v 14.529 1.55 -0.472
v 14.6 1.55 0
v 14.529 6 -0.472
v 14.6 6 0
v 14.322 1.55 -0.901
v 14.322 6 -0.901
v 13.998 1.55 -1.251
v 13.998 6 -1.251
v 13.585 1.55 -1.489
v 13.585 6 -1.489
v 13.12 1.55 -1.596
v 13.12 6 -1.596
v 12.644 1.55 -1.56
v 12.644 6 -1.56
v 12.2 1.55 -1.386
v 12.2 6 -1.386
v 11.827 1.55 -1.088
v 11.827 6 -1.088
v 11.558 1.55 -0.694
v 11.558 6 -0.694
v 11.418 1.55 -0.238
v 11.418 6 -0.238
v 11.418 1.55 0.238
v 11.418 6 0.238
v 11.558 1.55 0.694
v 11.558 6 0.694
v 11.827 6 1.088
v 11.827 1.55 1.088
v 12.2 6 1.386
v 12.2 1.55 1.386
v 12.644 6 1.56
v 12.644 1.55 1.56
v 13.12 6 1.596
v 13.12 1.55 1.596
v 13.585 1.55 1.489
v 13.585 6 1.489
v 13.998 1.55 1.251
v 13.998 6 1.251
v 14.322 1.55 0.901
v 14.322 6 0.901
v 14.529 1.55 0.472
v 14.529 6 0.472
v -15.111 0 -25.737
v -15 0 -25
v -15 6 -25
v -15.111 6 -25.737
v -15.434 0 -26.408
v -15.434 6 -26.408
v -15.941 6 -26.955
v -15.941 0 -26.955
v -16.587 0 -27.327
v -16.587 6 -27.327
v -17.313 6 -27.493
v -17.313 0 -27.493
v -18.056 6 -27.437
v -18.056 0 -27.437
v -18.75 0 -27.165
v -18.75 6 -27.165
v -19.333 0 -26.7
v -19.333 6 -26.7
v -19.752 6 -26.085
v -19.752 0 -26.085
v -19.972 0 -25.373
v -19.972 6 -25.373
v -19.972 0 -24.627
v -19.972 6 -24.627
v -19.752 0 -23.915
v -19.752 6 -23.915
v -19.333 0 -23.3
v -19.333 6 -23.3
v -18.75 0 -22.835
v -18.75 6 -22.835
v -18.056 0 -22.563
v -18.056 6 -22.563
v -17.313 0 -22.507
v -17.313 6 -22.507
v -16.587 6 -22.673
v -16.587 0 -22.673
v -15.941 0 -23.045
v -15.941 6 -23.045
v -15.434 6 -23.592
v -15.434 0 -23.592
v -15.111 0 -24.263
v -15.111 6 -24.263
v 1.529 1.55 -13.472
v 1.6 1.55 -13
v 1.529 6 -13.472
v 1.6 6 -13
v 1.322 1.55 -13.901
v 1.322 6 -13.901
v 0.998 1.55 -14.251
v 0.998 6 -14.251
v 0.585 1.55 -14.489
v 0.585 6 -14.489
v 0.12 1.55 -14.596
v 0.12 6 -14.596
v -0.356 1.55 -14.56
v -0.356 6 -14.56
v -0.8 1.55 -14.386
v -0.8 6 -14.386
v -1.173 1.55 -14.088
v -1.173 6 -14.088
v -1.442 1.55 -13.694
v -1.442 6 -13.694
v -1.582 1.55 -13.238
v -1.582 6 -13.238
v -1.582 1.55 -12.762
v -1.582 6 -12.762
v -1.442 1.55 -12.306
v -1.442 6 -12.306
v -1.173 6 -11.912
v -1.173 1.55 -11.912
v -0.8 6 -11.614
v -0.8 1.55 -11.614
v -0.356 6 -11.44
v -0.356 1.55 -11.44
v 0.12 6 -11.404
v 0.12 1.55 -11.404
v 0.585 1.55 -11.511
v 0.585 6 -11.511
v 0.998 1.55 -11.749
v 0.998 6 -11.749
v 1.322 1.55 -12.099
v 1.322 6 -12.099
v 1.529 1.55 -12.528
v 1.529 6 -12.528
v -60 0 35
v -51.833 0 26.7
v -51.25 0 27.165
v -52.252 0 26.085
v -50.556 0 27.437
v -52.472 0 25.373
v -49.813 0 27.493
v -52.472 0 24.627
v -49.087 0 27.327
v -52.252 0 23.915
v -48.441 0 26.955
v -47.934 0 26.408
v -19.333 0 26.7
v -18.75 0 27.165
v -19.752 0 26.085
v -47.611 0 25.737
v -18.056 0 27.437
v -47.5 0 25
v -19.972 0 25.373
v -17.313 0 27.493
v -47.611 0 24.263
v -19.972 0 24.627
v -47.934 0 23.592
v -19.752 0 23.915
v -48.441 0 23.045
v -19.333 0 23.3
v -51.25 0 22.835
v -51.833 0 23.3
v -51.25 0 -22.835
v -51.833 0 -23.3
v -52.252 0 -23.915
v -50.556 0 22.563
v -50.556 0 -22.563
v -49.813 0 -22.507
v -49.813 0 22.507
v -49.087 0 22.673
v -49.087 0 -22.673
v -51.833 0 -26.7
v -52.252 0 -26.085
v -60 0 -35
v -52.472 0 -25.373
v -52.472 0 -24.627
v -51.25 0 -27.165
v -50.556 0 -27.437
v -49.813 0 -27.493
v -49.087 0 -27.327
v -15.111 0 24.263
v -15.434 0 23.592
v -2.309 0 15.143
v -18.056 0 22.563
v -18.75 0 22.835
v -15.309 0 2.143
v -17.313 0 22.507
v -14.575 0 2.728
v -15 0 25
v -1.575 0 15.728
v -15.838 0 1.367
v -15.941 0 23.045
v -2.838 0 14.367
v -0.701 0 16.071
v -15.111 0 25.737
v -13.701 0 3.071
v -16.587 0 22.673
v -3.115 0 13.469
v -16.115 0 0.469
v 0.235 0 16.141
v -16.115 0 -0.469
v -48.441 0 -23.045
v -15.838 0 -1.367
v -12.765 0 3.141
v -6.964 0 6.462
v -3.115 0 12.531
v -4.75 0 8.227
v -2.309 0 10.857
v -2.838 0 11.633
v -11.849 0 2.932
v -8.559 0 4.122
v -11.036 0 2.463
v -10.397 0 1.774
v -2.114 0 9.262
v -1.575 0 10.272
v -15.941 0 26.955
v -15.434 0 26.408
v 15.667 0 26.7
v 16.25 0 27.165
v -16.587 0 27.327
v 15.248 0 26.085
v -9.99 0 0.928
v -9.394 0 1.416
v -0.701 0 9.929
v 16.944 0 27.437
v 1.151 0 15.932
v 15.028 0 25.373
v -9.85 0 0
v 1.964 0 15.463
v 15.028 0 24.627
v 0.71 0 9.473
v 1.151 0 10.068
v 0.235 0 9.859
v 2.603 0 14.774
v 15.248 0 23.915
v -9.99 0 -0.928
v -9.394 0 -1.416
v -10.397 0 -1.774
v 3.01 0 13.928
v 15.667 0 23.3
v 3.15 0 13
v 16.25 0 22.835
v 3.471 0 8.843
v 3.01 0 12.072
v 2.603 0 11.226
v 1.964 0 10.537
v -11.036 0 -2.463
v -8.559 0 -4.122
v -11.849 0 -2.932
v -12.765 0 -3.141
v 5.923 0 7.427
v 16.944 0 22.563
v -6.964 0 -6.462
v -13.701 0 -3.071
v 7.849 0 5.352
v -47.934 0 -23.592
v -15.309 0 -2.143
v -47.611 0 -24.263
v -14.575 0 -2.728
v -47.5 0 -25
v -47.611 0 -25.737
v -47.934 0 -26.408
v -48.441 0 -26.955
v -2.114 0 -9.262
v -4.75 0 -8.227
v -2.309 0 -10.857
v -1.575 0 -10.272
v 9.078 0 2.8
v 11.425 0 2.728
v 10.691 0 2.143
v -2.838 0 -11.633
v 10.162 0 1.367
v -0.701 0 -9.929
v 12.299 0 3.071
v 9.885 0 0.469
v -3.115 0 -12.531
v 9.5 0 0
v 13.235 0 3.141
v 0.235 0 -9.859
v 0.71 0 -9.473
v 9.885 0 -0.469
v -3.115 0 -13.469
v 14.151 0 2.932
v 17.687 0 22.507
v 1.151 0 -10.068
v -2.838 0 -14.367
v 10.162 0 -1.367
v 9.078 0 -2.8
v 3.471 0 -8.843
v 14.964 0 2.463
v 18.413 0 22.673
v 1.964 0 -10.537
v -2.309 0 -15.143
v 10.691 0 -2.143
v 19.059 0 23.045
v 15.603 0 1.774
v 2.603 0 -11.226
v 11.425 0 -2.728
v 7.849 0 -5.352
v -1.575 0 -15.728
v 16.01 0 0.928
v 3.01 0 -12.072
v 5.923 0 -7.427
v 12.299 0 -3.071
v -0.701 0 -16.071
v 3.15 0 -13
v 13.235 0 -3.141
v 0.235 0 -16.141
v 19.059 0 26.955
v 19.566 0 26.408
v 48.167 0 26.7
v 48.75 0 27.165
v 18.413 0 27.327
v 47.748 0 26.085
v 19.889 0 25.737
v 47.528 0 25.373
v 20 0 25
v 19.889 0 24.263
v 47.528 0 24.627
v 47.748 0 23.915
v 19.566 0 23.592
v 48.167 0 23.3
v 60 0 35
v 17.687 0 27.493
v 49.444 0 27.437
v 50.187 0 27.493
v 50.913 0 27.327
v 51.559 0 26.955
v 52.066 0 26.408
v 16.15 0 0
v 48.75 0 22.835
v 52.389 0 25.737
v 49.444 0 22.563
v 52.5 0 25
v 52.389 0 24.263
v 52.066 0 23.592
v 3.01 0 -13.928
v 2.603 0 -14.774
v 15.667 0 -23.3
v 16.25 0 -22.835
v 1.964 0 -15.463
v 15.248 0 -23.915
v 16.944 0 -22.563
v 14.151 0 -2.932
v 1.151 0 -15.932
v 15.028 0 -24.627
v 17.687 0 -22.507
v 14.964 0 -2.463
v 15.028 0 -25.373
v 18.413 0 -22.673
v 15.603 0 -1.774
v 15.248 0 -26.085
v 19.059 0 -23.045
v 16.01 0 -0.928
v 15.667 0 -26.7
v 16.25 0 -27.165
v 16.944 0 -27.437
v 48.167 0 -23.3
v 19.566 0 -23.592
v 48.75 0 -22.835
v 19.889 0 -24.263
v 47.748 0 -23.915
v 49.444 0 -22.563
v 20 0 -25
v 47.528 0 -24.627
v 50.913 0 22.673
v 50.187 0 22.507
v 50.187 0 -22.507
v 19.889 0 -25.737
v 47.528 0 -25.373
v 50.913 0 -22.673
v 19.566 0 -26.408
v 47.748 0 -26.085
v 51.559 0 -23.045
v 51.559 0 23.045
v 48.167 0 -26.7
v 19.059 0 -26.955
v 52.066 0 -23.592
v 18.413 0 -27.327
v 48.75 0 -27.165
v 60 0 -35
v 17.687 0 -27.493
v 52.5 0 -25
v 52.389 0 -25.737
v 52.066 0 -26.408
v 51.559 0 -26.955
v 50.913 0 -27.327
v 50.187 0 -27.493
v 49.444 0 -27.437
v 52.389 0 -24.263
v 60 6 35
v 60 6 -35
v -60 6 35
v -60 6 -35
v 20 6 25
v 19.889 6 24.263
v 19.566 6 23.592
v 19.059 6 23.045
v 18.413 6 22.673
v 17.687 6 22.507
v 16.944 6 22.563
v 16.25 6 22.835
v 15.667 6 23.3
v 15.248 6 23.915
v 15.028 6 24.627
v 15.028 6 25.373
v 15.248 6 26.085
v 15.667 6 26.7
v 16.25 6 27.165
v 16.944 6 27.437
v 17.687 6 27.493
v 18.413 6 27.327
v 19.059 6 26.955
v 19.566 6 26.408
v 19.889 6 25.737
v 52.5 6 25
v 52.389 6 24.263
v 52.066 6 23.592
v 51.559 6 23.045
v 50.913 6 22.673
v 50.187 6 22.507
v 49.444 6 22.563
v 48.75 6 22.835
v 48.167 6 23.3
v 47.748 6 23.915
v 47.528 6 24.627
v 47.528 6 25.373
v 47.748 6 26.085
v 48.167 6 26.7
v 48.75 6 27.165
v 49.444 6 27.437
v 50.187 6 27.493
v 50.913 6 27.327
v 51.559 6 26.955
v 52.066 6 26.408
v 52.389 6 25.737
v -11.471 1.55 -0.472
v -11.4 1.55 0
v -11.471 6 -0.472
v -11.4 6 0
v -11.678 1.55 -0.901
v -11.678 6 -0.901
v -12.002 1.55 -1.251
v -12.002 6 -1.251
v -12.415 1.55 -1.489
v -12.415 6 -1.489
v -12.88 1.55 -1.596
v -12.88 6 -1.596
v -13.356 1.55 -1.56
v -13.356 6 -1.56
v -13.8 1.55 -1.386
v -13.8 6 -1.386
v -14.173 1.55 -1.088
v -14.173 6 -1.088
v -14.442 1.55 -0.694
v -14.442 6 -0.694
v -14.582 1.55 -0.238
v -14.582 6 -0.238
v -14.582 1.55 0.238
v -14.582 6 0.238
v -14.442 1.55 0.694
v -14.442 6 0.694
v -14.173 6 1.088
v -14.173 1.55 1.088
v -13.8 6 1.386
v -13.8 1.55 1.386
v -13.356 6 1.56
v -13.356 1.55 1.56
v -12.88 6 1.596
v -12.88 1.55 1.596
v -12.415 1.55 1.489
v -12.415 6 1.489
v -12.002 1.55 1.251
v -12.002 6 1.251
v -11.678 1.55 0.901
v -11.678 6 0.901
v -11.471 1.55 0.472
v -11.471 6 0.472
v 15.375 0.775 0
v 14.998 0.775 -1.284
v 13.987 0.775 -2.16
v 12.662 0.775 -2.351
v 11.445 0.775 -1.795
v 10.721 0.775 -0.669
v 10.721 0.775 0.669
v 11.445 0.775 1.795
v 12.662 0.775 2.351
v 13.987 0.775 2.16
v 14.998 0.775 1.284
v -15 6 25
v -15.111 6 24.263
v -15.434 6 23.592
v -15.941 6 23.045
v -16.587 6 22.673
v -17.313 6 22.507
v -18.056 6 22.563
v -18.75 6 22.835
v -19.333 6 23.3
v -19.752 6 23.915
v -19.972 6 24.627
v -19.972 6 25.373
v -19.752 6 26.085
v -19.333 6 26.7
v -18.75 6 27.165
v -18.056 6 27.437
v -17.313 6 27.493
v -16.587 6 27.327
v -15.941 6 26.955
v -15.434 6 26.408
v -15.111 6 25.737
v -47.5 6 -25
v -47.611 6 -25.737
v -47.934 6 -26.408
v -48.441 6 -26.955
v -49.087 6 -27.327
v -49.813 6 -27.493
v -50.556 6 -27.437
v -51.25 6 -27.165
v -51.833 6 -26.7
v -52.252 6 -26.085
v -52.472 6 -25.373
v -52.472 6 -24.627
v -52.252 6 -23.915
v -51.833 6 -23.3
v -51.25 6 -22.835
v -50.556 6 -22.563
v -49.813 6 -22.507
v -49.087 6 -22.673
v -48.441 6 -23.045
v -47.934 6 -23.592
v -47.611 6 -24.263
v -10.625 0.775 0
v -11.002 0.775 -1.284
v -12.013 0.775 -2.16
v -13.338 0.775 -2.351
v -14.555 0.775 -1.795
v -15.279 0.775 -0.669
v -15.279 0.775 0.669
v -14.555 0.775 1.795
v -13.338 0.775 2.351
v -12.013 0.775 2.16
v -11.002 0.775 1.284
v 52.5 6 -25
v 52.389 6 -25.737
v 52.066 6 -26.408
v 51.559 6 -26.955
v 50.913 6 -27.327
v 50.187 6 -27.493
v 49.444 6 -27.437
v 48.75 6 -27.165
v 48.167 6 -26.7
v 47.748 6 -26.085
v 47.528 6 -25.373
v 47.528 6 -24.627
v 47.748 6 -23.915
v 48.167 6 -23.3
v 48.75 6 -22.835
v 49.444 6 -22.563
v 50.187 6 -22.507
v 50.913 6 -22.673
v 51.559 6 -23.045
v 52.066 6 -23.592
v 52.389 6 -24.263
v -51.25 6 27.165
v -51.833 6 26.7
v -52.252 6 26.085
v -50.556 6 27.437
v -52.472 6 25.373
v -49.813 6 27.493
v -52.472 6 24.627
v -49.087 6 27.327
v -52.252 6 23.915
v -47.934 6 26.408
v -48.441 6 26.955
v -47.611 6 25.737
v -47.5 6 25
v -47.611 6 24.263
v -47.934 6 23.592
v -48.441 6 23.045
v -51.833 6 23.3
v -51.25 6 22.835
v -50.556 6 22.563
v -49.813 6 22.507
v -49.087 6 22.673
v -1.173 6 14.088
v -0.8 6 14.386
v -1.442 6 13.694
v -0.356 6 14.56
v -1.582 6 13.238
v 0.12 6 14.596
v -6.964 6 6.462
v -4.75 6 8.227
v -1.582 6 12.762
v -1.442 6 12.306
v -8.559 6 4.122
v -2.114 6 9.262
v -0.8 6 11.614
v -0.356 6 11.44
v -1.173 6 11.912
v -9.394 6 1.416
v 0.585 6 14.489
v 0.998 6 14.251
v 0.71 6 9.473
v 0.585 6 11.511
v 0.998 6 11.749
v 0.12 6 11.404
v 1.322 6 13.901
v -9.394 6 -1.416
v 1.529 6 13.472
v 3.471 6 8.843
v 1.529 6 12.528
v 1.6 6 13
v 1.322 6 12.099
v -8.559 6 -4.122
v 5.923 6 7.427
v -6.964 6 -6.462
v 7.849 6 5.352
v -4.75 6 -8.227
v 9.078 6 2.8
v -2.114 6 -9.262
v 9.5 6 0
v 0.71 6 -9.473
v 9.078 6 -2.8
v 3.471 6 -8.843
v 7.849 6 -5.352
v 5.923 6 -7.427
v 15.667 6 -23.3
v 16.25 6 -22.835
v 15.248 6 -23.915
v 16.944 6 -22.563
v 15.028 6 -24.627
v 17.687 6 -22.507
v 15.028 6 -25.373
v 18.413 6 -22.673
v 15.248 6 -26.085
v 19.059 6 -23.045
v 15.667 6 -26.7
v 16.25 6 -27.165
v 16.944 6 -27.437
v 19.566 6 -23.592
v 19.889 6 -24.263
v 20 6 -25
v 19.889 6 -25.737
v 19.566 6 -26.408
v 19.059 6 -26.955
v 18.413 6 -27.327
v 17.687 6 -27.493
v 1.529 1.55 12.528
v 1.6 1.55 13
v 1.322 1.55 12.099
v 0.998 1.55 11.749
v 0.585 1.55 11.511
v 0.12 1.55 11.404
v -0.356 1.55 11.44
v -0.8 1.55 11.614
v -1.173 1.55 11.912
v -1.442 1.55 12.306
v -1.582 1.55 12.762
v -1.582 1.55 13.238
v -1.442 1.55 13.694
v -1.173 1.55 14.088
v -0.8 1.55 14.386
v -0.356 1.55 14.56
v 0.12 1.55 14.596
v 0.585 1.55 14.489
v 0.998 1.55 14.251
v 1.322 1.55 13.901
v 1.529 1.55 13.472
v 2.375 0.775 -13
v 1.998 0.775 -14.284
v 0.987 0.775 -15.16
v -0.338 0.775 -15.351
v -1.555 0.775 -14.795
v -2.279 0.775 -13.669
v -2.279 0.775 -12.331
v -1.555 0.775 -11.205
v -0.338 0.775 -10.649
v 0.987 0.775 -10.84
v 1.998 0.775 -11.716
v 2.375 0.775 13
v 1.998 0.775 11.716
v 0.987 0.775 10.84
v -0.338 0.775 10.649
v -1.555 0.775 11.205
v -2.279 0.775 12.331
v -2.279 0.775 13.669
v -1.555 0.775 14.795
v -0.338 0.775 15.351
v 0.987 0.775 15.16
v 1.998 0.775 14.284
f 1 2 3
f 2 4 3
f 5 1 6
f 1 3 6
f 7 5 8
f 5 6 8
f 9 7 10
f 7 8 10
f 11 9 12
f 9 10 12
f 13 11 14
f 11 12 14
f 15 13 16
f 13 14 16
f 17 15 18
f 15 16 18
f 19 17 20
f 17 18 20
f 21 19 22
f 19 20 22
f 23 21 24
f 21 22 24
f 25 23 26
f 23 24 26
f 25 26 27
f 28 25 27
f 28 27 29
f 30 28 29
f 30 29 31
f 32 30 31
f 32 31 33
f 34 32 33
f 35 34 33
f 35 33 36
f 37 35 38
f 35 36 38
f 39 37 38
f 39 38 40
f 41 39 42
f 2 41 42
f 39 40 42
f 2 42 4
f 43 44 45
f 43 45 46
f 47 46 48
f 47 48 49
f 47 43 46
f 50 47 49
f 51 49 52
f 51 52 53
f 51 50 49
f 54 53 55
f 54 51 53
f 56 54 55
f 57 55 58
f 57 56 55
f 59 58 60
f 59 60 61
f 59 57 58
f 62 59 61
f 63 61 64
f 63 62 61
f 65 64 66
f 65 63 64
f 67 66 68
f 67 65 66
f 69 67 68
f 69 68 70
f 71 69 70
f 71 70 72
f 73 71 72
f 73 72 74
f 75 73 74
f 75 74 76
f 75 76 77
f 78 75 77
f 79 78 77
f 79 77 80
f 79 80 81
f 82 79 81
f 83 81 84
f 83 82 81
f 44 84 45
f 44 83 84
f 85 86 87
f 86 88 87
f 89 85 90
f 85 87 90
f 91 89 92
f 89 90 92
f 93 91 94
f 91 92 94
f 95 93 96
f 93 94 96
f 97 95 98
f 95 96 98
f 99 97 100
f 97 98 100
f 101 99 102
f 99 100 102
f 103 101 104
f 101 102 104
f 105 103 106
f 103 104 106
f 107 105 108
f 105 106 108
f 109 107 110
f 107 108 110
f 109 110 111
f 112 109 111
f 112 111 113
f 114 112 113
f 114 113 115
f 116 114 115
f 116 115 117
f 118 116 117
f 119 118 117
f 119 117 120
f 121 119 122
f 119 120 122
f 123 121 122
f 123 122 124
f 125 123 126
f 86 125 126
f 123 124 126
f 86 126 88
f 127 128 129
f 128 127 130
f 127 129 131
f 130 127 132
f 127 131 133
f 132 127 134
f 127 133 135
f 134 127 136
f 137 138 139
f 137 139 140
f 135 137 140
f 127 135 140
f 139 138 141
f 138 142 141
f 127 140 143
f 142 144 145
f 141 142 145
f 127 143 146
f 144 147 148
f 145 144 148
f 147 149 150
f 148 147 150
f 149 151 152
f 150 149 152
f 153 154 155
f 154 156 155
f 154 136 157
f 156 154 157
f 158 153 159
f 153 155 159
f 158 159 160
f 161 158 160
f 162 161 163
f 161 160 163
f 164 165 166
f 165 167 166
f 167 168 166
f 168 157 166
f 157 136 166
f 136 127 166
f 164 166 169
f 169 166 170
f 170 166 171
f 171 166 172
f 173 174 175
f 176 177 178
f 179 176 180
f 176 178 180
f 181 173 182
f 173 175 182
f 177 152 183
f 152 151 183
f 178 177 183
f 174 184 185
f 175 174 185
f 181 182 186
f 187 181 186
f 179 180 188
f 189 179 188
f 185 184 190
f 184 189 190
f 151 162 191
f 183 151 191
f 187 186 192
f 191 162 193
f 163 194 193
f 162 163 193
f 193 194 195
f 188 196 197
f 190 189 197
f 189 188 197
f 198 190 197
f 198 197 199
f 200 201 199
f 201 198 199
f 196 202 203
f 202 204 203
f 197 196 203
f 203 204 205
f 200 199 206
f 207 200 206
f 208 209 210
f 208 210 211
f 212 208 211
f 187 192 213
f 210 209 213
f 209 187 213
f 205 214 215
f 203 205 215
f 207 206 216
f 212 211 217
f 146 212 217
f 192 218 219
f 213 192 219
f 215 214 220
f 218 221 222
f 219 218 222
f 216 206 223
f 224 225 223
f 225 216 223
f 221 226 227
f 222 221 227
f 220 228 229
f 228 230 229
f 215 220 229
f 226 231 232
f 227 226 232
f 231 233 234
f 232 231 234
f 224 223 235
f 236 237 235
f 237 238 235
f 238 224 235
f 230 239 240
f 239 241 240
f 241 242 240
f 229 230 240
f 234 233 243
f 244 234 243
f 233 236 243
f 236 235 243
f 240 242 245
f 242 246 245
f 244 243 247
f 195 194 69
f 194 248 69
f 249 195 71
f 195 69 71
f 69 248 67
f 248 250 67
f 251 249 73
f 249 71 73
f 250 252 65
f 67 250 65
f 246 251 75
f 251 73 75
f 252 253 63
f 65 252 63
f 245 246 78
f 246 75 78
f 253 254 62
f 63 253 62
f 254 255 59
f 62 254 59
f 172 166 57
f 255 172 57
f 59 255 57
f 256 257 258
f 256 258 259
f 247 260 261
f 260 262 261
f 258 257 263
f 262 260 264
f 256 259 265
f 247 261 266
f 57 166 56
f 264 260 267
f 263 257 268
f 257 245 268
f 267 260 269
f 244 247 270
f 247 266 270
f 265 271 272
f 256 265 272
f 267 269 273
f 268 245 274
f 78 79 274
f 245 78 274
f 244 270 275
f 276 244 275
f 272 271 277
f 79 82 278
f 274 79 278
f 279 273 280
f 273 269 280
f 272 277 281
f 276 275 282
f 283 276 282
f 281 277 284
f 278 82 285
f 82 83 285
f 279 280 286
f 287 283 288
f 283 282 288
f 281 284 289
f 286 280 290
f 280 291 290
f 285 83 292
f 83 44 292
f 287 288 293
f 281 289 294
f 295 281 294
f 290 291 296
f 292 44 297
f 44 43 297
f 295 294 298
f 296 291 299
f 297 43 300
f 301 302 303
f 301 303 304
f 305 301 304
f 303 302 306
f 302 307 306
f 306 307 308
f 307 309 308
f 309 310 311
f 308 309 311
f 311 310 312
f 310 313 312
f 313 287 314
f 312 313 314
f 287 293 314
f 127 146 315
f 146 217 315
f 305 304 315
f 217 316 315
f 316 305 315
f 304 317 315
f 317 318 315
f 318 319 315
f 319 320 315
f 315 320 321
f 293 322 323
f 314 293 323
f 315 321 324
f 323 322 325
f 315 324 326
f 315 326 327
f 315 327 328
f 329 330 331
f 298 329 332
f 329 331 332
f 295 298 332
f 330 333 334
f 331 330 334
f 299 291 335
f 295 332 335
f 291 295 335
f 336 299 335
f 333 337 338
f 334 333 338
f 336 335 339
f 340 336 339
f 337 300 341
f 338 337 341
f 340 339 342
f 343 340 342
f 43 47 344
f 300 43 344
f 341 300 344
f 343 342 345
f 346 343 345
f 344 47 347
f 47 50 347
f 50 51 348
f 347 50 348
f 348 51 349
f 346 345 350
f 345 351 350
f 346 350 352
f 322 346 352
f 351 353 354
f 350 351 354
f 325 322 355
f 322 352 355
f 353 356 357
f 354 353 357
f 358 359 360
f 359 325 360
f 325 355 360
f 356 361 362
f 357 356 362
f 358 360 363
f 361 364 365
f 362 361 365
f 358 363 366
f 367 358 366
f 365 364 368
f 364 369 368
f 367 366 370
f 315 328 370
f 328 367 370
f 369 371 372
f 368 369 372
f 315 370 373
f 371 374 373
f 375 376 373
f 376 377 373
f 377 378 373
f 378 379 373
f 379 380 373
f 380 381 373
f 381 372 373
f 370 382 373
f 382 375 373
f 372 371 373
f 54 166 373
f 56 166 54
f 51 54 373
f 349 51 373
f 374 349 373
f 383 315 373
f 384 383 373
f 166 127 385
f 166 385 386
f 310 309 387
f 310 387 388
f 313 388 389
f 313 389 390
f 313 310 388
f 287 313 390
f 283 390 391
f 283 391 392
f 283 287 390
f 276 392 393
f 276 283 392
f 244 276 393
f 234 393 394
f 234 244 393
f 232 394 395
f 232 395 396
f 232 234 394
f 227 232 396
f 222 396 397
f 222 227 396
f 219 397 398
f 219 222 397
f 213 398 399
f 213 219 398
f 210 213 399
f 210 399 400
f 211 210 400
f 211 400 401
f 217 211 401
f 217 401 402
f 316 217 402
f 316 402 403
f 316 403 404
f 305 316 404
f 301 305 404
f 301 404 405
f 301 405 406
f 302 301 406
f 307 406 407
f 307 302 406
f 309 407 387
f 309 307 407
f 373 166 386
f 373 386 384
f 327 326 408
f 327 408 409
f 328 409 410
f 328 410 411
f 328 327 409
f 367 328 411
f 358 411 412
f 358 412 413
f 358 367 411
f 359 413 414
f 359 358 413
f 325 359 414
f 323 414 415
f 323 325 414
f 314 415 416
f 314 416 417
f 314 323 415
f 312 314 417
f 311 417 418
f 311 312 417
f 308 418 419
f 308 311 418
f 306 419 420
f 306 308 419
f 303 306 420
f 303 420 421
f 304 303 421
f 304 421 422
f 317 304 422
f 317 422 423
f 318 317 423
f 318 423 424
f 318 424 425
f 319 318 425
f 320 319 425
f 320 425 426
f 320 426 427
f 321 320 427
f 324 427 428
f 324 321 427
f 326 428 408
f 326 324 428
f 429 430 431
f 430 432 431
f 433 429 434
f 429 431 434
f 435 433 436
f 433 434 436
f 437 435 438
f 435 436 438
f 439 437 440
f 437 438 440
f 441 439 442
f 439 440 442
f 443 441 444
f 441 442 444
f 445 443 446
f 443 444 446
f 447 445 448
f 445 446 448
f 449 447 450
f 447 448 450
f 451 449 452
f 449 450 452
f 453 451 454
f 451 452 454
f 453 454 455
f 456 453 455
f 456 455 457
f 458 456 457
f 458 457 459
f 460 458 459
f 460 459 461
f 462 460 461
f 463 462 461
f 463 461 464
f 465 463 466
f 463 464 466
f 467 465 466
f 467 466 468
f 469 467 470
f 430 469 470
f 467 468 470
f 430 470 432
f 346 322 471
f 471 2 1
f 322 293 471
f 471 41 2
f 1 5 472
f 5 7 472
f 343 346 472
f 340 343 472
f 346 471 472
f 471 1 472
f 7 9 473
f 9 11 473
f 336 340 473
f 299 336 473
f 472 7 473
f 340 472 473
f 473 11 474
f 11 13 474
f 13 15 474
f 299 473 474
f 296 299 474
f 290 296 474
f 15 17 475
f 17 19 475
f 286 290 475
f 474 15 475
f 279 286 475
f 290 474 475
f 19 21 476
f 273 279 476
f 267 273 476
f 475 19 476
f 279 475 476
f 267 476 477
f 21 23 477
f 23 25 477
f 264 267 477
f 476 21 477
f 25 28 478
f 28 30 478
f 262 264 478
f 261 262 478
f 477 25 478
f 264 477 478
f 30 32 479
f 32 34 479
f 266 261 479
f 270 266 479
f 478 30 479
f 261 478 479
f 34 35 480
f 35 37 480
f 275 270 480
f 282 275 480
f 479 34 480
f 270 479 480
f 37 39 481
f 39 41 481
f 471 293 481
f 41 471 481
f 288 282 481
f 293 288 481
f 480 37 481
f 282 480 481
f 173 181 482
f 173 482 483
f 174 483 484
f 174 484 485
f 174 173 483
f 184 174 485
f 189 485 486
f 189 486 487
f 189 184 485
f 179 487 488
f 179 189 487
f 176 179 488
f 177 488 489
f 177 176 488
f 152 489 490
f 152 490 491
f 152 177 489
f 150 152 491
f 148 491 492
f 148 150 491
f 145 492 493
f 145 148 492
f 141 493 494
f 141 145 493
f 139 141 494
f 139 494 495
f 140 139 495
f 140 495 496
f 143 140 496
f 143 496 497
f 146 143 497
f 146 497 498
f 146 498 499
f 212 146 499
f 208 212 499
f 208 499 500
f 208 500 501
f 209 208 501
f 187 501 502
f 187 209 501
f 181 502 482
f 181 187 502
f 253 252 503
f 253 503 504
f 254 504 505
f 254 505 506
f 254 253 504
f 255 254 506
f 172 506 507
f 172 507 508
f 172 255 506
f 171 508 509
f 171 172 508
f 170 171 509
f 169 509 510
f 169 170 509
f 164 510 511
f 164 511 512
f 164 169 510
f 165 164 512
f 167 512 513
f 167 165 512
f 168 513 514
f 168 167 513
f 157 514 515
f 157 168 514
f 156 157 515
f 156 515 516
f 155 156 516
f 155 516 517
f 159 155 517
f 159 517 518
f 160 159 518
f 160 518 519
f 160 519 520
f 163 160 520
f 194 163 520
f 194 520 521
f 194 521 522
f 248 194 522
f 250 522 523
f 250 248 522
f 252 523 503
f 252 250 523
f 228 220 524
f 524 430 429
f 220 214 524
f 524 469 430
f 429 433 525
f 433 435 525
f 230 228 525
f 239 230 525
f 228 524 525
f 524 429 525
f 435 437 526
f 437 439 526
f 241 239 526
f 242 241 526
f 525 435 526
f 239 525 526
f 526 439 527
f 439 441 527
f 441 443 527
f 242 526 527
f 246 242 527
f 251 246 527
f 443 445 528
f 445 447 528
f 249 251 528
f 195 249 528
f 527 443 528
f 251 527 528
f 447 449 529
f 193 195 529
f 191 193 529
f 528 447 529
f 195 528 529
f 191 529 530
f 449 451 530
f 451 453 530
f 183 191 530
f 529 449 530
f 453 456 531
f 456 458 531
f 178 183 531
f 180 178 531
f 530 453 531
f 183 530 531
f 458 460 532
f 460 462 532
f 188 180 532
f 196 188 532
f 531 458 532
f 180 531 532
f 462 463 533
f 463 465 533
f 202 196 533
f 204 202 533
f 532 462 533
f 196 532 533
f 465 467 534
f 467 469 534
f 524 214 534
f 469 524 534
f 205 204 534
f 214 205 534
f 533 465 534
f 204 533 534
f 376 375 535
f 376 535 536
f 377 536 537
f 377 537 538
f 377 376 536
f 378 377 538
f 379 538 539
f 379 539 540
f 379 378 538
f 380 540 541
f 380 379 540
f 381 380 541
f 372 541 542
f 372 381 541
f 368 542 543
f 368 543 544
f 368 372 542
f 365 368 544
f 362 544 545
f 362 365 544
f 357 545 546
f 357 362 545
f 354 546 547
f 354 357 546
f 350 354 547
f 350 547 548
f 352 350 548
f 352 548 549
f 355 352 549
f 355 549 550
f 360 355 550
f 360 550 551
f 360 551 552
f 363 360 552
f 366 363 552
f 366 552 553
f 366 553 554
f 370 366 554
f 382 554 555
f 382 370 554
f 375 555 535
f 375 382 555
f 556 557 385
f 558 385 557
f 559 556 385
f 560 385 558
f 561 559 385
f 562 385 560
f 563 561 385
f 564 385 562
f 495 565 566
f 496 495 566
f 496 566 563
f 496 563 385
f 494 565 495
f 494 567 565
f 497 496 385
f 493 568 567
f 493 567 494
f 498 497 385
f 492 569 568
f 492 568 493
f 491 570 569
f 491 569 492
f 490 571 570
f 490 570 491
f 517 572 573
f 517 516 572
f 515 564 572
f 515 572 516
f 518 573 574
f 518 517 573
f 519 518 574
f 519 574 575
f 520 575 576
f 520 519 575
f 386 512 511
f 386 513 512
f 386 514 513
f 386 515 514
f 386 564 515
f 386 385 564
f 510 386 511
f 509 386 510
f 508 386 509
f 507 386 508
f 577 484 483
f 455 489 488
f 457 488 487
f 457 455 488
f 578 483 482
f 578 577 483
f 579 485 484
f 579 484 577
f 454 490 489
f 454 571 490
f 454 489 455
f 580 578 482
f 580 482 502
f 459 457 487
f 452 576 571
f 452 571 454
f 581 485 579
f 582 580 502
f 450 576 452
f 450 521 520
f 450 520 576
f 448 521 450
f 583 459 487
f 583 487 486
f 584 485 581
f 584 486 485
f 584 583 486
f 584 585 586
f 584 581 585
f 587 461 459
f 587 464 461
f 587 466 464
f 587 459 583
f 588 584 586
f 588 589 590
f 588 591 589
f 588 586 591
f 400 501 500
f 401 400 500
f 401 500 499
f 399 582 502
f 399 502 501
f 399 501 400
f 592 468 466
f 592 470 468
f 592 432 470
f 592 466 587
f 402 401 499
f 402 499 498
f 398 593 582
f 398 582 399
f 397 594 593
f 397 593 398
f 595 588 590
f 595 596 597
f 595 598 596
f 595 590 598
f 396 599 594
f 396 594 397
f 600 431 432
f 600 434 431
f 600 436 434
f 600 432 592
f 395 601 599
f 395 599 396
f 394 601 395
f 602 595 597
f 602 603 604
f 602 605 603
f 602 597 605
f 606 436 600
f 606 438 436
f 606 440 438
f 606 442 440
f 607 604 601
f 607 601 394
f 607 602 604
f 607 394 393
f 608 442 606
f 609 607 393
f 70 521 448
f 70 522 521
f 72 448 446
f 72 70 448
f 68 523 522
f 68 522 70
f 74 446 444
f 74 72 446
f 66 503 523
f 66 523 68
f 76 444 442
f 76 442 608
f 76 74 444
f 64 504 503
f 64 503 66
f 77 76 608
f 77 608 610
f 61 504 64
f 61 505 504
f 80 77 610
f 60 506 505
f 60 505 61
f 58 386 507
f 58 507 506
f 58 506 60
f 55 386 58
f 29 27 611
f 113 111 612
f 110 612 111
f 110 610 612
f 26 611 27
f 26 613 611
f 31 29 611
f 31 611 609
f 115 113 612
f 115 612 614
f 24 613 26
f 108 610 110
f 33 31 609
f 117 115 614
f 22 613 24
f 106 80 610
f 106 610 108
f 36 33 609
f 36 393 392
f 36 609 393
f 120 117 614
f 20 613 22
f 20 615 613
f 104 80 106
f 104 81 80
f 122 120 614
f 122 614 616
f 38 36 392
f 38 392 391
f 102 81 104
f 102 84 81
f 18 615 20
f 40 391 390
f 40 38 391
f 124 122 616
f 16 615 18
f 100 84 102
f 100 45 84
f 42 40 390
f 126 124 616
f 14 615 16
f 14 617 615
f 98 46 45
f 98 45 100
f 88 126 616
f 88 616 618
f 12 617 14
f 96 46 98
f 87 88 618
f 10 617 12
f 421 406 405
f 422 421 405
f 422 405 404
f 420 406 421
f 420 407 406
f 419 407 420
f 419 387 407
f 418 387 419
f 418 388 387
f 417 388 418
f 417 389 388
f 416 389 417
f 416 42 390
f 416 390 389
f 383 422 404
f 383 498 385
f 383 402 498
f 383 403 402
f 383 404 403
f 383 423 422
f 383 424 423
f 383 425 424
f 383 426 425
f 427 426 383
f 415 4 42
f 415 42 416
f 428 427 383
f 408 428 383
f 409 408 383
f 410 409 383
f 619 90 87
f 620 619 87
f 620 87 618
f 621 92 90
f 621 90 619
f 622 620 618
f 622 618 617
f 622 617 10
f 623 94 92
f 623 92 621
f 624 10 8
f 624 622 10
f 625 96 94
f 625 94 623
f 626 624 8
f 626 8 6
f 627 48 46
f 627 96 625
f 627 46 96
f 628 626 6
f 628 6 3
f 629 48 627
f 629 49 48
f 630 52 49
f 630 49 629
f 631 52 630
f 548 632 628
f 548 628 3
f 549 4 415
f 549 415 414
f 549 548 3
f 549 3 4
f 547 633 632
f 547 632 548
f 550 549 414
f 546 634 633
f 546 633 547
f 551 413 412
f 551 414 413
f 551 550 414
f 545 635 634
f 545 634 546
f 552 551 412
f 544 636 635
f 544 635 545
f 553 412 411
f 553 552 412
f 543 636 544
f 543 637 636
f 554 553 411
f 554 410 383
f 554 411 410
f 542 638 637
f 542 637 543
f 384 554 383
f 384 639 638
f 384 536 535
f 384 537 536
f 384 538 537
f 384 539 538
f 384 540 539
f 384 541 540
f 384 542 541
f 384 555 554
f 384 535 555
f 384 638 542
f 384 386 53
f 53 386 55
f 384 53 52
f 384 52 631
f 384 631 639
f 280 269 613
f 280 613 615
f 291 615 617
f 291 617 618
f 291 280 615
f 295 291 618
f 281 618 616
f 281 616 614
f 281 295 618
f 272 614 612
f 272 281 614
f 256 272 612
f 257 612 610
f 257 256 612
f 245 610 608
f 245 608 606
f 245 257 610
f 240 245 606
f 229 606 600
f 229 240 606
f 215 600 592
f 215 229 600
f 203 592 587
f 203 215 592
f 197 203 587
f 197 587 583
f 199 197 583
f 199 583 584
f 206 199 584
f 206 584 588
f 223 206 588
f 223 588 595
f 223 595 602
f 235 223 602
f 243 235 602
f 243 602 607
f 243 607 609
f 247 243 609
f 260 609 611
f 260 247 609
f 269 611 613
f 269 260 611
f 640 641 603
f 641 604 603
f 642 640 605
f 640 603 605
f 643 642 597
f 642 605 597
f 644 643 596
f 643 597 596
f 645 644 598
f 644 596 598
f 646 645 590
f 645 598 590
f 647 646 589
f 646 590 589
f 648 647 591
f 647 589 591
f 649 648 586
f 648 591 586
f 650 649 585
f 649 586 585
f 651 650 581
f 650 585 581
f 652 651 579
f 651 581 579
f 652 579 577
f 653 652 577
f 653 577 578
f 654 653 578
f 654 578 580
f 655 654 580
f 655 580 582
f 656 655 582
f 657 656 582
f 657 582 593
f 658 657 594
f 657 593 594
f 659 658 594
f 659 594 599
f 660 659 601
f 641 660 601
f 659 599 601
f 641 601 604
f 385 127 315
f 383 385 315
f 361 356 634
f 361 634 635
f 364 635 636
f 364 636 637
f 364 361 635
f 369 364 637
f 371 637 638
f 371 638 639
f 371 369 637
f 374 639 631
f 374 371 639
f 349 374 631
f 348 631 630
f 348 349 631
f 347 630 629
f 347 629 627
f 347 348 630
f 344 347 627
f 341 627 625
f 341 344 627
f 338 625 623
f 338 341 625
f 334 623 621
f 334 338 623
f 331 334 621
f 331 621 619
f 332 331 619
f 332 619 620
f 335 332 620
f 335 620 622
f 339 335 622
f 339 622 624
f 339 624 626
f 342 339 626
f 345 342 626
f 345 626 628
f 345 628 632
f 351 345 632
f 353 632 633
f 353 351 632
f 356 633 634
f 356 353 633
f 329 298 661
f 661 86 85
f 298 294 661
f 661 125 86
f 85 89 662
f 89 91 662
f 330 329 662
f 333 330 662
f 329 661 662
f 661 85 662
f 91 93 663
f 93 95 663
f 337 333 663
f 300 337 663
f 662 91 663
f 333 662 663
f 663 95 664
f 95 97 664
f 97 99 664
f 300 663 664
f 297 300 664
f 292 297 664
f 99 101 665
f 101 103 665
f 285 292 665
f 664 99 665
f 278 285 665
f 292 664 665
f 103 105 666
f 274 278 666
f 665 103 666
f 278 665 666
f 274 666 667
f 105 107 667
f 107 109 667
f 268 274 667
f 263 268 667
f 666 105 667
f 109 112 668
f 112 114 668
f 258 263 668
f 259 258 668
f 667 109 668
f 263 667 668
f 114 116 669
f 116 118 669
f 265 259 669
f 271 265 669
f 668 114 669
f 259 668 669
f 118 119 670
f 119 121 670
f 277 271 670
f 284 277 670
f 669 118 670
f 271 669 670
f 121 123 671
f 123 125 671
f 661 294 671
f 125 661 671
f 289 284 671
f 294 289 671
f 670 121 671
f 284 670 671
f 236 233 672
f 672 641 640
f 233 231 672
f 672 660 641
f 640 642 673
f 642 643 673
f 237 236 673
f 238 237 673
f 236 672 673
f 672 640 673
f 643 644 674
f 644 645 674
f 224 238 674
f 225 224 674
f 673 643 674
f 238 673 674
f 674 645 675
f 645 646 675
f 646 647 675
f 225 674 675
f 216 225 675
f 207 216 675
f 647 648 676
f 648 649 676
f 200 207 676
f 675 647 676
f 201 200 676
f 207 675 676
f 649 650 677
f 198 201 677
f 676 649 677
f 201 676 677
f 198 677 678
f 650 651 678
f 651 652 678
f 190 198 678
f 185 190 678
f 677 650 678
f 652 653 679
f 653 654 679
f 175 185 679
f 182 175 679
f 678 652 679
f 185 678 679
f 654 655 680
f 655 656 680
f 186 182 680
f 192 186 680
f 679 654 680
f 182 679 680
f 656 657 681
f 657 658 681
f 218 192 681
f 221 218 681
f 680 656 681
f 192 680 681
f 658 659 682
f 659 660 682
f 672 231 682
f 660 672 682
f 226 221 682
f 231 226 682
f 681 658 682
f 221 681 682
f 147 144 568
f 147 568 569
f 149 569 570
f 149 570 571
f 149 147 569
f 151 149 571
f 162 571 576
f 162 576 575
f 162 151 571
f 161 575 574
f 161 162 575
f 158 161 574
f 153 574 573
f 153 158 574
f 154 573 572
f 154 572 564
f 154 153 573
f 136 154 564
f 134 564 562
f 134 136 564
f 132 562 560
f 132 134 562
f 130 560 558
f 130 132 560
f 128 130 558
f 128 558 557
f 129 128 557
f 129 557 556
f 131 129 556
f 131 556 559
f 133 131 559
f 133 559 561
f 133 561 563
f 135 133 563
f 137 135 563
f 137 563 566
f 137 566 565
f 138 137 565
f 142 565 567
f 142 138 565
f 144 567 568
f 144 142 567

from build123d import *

# Parameters (mm, degrees)
SKETCH1_W                                       = 120
SKETCH1_H                                       = 70
SKETCH1_R                                       = 9.5
SKETCH1_R_2                                     = 2.5
BOSS_EXTRUDE1_DEPTH                             = 6
CSK_FOR_M3_FLAT_HEAD_MACHINE_SCREW1_D           = 3.2
CSK_FOR_M3_FLAT_HEAD_MACHINE_SCREW1_CSINK_D     = 6.3
CSK_FOR_M3_FLAT_HEAD_MACHINE_SCREW1_CSINK_ANGLE = 90


with BuildPart() as part:
    # Sketch1 → Boss-Extrude1 (new body)
    with BuildSketch(Plane(origin=(0, 0, 0), x_dir=(1, 0, 0), z_dir=(0, 1, 0))):
        Rectangle(SKETCH1_W, SKETCH1_H)
        Circle(SKETCH1_R, mode=Mode.SUBTRACT)
        with Locations((-17.5, 25)):
            Circle(SKETCH1_R_2, mode=Mode.SUBTRACT)
        with Locations((17.5, 25)):
            Circle(SKETCH1_R_2, mode=Mode.SUBTRACT)
        with Locations((17.5, -25)):
            Circle(SKETCH1_R_2, mode=Mode.SUBTRACT)
        with Locations((-17.5, -25)):
            Circle(SKETCH1_R_2, mode=Mode.SUBTRACT)
        with Locations((-50, 25)):
            Circle(SKETCH1_R_2, mode=Mode.SUBTRACT)
        with Locations((-50, -25)):
            Circle(SKETCH1_R_2, mode=Mode.SUBTRACT)
        with Locations((50, -25)):
            Circle(SKETCH1_R_2, mode=Mode.SUBTRACT)
        with Locations((50, 25)):
            Circle(SKETCH1_R_2, mode=Mode.SUBTRACT)
    extrude(amount=BOSS_EXTRUDE1_DEPTH)

    # CSK for M3 Flat Head Machine Screw1 (through all)
    with Locations(Plane(origin=(0, 0, 0), x_dir=(-1, 0, 0), z_dir=(0, -1, 0))):
        with Locations((-13, 0), (0, -13), (13, 0), (0, 13)):
            CounterSinkHole(CSK_FOR_M3_FLAT_HEAD_MACHINE_SCREW1_D / 2, CSK_FOR_M3_FLAT_HEAD_MACHINE_SCREW1_CSINK_D / 2, counter_sink_angle=CSK_FOR_M3_FLAT_HEAD_MACHINE_SCREW1_CSINK_ANGLE)


solid = part.part
